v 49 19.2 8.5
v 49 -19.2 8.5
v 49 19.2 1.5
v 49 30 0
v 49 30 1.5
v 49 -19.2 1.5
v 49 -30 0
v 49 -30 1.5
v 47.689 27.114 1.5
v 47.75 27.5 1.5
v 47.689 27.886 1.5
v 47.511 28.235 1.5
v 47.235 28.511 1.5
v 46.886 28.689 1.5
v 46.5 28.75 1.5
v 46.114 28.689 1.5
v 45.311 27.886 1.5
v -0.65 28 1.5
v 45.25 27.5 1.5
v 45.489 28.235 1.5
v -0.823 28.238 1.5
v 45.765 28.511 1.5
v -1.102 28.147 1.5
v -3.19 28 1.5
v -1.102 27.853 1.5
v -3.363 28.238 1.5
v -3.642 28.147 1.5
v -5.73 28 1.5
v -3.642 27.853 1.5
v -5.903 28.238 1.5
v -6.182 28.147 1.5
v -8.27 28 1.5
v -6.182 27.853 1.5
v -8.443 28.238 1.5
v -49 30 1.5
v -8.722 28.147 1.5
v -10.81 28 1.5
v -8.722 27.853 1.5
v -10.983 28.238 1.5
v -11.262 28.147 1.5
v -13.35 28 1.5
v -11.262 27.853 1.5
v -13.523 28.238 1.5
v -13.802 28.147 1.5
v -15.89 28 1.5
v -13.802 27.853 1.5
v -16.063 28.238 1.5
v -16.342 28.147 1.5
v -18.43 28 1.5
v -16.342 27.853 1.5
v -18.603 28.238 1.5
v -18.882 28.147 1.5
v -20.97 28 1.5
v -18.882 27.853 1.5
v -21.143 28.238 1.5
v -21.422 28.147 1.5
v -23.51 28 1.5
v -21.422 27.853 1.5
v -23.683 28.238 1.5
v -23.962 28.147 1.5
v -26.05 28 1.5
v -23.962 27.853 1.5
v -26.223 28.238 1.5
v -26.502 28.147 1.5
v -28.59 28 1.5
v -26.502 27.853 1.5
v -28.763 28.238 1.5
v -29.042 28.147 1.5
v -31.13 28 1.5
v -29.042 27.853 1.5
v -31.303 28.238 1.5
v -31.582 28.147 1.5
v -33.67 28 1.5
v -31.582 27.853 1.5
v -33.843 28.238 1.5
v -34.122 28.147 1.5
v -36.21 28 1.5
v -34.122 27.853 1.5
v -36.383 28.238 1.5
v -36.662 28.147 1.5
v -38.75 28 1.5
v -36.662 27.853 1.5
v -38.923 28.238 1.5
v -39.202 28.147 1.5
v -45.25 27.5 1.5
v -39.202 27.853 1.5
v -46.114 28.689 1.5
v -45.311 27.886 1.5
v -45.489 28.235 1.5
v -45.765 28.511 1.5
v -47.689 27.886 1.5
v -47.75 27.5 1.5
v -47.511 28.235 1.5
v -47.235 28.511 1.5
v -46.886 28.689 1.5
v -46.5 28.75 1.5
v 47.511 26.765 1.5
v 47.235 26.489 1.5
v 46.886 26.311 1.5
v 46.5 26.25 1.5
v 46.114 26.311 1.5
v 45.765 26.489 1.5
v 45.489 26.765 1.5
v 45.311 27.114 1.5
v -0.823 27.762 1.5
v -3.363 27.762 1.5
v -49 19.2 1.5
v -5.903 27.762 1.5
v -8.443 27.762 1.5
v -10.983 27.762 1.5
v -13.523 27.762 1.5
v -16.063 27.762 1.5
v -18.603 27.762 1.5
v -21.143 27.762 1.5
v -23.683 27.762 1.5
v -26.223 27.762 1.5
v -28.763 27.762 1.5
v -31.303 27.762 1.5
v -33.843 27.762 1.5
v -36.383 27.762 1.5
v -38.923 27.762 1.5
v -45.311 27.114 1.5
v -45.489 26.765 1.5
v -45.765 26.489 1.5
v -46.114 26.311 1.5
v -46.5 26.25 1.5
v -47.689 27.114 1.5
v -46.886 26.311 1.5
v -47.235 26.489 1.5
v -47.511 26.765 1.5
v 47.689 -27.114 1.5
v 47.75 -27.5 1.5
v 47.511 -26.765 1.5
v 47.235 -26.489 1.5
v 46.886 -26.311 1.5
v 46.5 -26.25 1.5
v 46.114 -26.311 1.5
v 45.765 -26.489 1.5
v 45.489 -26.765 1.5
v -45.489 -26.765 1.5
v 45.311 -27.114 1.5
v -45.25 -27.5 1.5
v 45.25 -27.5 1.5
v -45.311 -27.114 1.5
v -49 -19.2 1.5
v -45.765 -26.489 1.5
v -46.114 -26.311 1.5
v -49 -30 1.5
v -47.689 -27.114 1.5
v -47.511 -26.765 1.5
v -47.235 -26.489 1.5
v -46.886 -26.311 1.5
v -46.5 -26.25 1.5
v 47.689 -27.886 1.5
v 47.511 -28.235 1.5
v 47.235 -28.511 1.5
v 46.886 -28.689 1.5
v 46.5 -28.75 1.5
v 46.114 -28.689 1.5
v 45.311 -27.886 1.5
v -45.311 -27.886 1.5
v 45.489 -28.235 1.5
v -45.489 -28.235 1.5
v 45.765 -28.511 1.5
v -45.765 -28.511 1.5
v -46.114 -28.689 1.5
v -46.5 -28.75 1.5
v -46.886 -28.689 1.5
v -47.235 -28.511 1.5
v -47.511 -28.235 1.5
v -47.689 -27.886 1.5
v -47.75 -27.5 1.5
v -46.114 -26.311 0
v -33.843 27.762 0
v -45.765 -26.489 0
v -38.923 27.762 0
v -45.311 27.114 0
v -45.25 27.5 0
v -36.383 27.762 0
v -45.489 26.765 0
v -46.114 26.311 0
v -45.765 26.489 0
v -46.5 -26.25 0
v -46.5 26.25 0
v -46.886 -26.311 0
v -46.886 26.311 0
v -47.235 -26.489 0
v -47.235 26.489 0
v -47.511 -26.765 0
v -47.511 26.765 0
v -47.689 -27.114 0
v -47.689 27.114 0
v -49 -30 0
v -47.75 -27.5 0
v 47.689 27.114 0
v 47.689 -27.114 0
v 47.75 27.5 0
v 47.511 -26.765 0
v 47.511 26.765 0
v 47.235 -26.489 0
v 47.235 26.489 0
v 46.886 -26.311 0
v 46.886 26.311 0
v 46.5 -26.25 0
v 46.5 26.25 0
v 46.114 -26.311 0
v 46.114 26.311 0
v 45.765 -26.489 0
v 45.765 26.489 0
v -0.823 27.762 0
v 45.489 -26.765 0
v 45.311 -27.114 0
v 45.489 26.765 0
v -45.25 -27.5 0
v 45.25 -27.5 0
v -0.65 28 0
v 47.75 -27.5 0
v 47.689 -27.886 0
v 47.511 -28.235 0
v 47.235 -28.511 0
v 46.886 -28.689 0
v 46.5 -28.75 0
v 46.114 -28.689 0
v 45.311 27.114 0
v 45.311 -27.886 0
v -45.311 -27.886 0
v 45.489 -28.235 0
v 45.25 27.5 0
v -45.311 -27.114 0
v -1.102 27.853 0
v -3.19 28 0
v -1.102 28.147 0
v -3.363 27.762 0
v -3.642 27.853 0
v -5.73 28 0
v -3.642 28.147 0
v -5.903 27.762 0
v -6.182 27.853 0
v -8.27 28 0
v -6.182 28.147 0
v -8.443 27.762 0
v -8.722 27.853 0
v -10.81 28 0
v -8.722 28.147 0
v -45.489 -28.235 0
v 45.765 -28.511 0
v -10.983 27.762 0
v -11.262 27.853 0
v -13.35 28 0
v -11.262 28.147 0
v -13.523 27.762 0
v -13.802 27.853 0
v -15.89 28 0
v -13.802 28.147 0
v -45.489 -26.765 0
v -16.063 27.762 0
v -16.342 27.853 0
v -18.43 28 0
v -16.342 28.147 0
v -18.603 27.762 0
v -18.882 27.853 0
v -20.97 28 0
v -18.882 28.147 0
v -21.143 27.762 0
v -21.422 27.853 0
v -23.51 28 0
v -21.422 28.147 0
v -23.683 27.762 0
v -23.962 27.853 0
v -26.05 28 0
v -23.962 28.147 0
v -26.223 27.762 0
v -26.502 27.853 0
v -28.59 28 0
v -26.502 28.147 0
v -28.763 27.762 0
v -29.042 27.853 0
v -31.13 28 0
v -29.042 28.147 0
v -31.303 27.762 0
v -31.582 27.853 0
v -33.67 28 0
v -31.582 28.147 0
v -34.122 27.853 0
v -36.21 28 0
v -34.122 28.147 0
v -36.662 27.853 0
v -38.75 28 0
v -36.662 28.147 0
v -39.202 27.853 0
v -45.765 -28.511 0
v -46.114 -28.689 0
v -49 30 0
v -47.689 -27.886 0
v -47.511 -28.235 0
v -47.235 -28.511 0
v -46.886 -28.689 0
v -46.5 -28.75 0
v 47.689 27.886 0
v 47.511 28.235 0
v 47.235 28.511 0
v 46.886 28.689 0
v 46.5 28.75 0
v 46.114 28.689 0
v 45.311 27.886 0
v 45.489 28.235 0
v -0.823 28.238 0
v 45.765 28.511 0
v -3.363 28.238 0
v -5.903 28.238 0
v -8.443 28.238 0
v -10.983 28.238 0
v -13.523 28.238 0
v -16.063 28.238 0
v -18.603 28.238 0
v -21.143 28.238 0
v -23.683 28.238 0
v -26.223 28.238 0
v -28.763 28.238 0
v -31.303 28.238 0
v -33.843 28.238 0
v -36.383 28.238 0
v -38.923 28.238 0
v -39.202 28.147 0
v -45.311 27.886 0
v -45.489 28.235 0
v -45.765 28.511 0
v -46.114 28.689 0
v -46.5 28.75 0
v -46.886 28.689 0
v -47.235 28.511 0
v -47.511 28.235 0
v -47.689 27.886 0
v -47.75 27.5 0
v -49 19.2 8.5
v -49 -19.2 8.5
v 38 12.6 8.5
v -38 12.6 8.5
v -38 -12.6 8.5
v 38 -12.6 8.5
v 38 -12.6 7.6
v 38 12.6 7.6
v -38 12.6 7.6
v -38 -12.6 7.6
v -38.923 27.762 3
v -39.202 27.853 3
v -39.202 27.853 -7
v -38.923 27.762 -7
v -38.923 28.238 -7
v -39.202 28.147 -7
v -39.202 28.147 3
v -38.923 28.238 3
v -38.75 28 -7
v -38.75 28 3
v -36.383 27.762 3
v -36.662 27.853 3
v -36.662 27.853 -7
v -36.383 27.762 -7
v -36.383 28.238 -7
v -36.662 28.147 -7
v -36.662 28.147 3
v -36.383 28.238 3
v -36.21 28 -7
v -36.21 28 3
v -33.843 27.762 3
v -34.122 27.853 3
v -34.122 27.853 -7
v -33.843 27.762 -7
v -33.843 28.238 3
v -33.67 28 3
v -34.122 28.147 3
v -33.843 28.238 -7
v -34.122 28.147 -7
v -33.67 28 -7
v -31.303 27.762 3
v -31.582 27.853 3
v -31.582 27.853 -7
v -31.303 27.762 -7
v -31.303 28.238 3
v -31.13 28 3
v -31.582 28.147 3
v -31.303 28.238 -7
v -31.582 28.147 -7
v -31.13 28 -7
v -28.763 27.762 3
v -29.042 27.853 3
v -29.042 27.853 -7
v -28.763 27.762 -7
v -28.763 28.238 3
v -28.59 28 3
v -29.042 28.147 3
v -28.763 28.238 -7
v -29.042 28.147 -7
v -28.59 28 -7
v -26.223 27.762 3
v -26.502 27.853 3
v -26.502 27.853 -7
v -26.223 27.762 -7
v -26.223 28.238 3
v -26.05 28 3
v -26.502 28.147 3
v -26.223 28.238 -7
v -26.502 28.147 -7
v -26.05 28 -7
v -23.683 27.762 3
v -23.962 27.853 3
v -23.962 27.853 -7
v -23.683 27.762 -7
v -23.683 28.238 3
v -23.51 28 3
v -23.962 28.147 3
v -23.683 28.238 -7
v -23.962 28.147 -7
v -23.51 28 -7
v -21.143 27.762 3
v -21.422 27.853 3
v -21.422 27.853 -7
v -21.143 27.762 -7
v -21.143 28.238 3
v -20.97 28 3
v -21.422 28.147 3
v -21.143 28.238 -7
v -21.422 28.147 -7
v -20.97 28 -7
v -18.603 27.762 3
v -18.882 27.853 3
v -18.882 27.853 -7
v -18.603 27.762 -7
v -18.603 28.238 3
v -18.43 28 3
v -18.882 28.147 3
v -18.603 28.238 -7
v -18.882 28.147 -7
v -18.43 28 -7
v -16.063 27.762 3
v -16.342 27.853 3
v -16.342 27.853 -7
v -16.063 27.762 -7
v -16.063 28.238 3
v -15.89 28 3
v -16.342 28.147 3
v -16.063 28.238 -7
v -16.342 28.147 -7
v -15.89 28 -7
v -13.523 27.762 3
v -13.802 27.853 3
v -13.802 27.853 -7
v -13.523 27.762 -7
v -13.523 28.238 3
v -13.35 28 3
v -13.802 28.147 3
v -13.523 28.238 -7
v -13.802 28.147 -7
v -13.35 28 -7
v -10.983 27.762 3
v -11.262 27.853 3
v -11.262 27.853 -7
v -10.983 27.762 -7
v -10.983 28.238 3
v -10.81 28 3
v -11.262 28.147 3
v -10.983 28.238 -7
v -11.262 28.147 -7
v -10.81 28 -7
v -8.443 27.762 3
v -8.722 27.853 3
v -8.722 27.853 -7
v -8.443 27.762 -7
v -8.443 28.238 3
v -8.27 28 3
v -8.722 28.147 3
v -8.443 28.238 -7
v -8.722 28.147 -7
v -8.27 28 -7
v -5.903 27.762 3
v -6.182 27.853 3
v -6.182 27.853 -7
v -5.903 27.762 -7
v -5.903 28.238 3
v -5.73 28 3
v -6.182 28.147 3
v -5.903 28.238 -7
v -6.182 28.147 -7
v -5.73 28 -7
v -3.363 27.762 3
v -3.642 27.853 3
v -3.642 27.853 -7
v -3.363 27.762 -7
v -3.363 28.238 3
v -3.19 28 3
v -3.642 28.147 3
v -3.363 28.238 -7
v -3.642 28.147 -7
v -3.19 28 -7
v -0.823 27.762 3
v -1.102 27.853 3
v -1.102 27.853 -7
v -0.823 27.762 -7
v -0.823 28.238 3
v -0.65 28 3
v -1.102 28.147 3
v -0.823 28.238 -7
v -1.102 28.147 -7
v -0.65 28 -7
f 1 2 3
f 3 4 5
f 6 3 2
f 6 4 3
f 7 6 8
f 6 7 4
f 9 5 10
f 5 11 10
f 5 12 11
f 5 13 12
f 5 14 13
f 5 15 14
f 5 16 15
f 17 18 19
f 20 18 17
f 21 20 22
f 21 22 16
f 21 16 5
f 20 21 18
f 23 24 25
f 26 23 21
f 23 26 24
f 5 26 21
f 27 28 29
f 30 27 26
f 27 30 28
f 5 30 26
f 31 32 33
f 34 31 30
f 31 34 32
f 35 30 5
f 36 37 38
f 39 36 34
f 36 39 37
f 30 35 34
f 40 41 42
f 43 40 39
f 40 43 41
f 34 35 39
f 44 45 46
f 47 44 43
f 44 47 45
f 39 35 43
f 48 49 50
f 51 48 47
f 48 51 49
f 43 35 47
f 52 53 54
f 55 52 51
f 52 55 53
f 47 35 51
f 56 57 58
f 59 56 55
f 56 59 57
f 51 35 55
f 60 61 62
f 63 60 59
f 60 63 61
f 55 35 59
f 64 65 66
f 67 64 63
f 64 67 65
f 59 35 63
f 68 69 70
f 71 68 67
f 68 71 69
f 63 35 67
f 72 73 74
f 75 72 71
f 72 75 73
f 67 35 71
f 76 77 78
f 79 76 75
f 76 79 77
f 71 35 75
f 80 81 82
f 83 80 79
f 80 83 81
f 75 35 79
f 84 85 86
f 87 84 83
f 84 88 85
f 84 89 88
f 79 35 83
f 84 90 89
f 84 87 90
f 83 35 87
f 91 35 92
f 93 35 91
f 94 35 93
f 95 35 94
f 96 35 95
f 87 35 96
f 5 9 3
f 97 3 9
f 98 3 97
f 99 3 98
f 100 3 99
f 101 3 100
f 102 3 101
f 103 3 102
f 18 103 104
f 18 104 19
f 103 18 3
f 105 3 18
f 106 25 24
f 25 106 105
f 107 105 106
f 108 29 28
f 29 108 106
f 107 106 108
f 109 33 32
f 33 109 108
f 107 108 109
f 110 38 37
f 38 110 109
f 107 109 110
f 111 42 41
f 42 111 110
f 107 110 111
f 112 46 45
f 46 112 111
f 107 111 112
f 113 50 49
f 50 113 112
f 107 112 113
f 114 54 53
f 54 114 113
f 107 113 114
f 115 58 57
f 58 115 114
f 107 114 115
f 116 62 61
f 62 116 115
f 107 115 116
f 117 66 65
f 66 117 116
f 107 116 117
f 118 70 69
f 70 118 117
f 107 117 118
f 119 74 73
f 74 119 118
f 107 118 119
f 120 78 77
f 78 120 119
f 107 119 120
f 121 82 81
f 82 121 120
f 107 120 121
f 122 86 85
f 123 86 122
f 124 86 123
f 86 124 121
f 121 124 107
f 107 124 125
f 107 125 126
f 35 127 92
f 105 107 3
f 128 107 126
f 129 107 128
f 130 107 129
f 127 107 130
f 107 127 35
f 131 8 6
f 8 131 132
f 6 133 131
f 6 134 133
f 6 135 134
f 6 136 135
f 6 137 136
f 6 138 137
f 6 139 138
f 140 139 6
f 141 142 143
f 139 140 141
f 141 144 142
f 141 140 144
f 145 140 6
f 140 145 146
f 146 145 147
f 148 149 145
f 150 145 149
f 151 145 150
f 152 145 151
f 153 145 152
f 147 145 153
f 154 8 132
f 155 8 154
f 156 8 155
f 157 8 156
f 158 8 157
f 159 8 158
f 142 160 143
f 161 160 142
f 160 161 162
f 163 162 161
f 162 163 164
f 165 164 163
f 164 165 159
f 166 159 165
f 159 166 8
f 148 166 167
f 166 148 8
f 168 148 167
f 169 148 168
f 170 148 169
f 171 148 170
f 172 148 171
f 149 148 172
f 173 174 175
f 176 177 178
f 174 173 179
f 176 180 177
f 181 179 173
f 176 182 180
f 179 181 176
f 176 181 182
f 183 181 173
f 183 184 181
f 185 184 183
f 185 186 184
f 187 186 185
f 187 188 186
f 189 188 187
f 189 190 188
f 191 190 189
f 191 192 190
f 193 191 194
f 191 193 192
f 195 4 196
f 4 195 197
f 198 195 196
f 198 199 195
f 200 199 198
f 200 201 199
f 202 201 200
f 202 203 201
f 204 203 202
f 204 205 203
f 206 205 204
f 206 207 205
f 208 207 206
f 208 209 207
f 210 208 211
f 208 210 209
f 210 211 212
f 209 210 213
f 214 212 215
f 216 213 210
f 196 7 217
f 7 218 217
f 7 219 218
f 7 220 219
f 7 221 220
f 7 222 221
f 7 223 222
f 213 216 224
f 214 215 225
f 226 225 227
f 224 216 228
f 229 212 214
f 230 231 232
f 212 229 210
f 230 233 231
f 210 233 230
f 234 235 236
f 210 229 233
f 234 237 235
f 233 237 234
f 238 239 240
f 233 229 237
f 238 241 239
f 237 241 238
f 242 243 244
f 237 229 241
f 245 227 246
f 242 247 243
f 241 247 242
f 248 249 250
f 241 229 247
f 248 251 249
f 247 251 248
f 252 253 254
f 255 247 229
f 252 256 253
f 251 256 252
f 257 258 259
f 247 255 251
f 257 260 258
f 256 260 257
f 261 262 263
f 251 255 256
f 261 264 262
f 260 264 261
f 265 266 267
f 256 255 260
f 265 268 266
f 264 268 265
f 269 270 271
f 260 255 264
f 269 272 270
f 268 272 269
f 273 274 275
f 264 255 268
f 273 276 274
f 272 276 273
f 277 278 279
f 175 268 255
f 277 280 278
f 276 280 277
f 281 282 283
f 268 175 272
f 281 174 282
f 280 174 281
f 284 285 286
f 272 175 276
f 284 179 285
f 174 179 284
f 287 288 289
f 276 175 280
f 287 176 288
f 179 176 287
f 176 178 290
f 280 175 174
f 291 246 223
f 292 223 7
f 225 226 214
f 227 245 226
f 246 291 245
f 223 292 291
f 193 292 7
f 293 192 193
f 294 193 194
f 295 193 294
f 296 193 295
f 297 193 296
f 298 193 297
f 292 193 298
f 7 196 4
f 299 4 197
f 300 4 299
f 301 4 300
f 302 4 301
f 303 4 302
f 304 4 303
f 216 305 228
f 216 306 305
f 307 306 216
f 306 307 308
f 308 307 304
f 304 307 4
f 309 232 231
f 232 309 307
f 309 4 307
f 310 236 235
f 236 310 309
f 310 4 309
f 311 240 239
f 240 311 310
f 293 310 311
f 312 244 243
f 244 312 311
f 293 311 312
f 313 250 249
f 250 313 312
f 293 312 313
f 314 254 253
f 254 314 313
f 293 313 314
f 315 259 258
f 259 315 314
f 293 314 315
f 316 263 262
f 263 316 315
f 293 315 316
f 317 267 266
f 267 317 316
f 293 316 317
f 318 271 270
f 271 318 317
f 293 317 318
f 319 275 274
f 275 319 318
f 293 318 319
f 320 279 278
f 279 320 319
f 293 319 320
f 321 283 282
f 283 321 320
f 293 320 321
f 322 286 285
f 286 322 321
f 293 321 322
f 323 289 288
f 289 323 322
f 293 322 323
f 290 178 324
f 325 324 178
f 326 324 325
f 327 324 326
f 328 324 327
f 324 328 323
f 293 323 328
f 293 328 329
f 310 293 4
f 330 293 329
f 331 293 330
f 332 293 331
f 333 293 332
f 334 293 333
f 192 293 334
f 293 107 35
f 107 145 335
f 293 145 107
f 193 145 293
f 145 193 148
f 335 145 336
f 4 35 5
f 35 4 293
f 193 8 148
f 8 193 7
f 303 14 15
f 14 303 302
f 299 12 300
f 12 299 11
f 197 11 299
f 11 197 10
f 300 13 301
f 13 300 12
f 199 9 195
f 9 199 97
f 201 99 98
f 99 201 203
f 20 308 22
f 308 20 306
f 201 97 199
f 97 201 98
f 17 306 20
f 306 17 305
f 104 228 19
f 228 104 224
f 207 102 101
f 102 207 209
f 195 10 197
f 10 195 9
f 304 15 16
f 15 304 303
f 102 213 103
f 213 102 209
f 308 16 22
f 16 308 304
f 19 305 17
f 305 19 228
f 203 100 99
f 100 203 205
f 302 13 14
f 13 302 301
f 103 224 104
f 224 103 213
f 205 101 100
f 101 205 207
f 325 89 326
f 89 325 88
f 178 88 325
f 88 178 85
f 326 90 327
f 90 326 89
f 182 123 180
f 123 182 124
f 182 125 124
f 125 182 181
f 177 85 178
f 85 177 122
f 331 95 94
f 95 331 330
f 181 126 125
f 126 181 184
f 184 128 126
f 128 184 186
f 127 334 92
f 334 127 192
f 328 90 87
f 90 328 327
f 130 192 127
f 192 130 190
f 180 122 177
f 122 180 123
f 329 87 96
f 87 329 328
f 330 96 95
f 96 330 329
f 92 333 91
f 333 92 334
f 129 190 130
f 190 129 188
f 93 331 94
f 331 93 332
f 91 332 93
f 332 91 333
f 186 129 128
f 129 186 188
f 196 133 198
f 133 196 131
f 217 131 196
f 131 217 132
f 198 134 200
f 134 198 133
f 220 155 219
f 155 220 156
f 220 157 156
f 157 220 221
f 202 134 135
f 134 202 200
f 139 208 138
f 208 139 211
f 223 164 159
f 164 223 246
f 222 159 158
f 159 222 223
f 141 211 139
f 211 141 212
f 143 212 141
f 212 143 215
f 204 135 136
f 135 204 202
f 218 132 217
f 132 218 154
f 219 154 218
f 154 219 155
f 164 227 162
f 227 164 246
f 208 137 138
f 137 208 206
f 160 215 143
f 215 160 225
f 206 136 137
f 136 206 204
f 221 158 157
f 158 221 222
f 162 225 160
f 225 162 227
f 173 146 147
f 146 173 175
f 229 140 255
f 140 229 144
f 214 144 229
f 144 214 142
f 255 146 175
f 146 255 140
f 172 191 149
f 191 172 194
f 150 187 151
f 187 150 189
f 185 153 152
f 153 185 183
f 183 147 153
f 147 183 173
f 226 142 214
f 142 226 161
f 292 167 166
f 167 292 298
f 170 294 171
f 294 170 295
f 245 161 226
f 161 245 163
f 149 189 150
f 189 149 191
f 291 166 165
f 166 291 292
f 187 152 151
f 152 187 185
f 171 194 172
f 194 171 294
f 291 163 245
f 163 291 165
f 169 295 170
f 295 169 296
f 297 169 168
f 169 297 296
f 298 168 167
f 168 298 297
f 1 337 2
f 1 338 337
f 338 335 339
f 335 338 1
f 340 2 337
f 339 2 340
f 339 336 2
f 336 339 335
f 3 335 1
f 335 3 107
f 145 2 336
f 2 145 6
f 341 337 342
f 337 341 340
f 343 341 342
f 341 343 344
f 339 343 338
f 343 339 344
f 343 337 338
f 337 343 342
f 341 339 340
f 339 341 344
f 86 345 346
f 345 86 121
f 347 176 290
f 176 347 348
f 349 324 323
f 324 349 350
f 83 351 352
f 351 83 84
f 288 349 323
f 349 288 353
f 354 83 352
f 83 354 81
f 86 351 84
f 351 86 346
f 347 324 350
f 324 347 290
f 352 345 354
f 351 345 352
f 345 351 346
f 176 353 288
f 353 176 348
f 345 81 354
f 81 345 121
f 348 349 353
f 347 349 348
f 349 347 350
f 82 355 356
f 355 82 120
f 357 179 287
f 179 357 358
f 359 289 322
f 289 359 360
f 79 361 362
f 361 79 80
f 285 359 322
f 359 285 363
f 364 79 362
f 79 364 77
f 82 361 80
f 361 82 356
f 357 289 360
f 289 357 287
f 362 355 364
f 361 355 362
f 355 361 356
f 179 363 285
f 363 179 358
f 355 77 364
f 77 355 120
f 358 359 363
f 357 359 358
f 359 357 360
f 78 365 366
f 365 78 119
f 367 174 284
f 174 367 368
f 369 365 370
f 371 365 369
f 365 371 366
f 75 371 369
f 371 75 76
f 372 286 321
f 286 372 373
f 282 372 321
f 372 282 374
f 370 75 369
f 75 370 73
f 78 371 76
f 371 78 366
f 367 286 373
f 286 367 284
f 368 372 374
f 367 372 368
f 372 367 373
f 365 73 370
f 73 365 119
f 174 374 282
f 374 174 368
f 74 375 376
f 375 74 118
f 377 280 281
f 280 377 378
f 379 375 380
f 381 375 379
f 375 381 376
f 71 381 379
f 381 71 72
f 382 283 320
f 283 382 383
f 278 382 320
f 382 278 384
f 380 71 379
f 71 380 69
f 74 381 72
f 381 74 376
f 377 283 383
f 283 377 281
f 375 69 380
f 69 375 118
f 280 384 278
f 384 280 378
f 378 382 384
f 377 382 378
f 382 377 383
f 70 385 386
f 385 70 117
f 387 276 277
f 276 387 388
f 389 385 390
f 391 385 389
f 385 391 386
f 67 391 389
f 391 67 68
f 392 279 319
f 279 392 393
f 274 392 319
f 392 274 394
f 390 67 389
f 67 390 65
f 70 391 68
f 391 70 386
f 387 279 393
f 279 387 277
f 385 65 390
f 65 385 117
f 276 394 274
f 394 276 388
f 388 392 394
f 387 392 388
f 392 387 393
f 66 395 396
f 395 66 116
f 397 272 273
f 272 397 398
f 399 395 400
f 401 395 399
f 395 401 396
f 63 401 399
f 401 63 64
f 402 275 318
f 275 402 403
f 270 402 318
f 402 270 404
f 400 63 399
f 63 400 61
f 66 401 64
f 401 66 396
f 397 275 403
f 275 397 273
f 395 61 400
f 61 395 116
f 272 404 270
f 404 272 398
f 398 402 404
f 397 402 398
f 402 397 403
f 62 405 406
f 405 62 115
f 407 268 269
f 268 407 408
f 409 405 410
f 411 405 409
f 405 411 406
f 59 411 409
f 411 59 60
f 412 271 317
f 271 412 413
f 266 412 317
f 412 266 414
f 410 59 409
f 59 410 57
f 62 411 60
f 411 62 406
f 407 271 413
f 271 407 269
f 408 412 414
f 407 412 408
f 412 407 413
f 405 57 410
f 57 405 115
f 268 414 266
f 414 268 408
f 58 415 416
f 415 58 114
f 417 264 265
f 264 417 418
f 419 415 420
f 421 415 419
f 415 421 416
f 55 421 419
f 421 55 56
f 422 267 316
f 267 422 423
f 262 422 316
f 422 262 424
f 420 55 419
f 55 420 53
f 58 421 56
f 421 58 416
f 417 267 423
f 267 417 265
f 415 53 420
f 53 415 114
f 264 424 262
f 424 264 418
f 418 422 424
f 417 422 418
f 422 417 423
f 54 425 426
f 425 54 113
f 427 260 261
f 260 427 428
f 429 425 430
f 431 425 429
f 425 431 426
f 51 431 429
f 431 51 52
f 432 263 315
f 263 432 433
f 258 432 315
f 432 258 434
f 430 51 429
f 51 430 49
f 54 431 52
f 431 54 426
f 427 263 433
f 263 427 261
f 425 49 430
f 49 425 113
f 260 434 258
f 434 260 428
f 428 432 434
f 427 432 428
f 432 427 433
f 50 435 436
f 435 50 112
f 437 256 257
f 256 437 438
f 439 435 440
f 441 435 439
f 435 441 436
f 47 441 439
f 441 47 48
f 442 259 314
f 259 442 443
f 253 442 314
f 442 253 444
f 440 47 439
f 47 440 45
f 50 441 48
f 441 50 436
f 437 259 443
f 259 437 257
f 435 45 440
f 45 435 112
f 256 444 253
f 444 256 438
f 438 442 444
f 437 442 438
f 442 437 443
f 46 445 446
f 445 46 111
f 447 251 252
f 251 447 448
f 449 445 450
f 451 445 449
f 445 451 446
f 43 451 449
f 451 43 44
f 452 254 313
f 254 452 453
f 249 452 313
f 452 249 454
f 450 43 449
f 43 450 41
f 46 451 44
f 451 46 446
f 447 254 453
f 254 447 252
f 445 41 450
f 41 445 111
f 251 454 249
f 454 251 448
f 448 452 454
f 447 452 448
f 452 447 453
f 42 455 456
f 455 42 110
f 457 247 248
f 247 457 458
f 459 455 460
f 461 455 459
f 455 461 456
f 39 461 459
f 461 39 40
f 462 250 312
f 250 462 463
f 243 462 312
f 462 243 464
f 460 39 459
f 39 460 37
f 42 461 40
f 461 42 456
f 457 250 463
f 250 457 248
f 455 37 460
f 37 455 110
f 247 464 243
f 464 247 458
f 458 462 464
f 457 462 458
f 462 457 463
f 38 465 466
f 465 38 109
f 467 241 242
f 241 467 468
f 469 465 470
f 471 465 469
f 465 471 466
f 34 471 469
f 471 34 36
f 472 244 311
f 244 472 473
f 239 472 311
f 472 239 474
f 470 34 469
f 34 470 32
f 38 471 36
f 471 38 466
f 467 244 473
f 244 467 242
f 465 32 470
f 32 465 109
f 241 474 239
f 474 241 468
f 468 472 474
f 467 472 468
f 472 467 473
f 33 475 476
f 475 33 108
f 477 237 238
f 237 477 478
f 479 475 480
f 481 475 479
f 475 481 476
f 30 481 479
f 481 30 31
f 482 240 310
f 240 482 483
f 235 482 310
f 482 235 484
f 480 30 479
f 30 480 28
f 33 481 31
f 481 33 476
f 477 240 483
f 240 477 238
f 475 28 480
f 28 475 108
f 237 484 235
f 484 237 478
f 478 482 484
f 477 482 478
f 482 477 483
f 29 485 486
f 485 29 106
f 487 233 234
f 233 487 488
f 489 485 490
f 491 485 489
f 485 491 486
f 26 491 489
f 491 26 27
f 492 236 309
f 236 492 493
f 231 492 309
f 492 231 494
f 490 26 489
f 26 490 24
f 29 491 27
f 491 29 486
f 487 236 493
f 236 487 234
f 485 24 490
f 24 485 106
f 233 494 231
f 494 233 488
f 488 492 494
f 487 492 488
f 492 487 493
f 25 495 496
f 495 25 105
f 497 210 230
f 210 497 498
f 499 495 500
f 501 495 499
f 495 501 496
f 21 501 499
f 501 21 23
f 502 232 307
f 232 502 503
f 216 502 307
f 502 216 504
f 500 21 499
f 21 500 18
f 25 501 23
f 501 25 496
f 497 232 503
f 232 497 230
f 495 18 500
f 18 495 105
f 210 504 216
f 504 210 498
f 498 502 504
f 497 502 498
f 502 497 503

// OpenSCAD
/*
scale(0.1)
import("/_shared_/dev/dev.projects/TOC/PEDALBOARD.GIT/doc/internal/3D.GrabCad/lcd-display-20x4-with-i2c-pcf8574-module-1.snapshot.1/LCD & Module Assem.STL");
*/

blackColor = [0.1, 0.1, 0.1, 1];
greenColor = [0.2, 0.6, 0.47, 1];


difference()  {
    color(greenColor)
    translate([0, 0, 1.5/2])
    cube([98, 60, 1.5], center=true);

    translate([93/2, 55/2, -1])
    cylinder(h=3, r=2.5/2, $fn=20);

    translate([-93/2, 55/2, -1])
    cylinder(h=3, r=2.5/2, $fn=20);

    translate([93/2, -55/2, -1])
    cylinder(h=3, r=2.5/2, $fn=20);

    translate([-93/2, -55/2, -1])
    cylinder(h=3, r=2.5/2, $fn=20);
}

difference() {
    color(blackColor)
    translate([0, 0, 1.5 + 7/2])
    cube([98, 38.40, 7], center=true);
    
    translate([0, 0, 1.5 + 7/2 + 1/2 + 2.6])
    cube([76, 25.20, 1], center=true);
}

translate([0, 60/2 - 2, -2])
for (x = [0:15]) {
    translate([10 + (x * 2.54) - (98 / 2), 0, 0])
    cylinder(h = 10, r1 = 0.25, r2 = 0.25, center = true);
}
